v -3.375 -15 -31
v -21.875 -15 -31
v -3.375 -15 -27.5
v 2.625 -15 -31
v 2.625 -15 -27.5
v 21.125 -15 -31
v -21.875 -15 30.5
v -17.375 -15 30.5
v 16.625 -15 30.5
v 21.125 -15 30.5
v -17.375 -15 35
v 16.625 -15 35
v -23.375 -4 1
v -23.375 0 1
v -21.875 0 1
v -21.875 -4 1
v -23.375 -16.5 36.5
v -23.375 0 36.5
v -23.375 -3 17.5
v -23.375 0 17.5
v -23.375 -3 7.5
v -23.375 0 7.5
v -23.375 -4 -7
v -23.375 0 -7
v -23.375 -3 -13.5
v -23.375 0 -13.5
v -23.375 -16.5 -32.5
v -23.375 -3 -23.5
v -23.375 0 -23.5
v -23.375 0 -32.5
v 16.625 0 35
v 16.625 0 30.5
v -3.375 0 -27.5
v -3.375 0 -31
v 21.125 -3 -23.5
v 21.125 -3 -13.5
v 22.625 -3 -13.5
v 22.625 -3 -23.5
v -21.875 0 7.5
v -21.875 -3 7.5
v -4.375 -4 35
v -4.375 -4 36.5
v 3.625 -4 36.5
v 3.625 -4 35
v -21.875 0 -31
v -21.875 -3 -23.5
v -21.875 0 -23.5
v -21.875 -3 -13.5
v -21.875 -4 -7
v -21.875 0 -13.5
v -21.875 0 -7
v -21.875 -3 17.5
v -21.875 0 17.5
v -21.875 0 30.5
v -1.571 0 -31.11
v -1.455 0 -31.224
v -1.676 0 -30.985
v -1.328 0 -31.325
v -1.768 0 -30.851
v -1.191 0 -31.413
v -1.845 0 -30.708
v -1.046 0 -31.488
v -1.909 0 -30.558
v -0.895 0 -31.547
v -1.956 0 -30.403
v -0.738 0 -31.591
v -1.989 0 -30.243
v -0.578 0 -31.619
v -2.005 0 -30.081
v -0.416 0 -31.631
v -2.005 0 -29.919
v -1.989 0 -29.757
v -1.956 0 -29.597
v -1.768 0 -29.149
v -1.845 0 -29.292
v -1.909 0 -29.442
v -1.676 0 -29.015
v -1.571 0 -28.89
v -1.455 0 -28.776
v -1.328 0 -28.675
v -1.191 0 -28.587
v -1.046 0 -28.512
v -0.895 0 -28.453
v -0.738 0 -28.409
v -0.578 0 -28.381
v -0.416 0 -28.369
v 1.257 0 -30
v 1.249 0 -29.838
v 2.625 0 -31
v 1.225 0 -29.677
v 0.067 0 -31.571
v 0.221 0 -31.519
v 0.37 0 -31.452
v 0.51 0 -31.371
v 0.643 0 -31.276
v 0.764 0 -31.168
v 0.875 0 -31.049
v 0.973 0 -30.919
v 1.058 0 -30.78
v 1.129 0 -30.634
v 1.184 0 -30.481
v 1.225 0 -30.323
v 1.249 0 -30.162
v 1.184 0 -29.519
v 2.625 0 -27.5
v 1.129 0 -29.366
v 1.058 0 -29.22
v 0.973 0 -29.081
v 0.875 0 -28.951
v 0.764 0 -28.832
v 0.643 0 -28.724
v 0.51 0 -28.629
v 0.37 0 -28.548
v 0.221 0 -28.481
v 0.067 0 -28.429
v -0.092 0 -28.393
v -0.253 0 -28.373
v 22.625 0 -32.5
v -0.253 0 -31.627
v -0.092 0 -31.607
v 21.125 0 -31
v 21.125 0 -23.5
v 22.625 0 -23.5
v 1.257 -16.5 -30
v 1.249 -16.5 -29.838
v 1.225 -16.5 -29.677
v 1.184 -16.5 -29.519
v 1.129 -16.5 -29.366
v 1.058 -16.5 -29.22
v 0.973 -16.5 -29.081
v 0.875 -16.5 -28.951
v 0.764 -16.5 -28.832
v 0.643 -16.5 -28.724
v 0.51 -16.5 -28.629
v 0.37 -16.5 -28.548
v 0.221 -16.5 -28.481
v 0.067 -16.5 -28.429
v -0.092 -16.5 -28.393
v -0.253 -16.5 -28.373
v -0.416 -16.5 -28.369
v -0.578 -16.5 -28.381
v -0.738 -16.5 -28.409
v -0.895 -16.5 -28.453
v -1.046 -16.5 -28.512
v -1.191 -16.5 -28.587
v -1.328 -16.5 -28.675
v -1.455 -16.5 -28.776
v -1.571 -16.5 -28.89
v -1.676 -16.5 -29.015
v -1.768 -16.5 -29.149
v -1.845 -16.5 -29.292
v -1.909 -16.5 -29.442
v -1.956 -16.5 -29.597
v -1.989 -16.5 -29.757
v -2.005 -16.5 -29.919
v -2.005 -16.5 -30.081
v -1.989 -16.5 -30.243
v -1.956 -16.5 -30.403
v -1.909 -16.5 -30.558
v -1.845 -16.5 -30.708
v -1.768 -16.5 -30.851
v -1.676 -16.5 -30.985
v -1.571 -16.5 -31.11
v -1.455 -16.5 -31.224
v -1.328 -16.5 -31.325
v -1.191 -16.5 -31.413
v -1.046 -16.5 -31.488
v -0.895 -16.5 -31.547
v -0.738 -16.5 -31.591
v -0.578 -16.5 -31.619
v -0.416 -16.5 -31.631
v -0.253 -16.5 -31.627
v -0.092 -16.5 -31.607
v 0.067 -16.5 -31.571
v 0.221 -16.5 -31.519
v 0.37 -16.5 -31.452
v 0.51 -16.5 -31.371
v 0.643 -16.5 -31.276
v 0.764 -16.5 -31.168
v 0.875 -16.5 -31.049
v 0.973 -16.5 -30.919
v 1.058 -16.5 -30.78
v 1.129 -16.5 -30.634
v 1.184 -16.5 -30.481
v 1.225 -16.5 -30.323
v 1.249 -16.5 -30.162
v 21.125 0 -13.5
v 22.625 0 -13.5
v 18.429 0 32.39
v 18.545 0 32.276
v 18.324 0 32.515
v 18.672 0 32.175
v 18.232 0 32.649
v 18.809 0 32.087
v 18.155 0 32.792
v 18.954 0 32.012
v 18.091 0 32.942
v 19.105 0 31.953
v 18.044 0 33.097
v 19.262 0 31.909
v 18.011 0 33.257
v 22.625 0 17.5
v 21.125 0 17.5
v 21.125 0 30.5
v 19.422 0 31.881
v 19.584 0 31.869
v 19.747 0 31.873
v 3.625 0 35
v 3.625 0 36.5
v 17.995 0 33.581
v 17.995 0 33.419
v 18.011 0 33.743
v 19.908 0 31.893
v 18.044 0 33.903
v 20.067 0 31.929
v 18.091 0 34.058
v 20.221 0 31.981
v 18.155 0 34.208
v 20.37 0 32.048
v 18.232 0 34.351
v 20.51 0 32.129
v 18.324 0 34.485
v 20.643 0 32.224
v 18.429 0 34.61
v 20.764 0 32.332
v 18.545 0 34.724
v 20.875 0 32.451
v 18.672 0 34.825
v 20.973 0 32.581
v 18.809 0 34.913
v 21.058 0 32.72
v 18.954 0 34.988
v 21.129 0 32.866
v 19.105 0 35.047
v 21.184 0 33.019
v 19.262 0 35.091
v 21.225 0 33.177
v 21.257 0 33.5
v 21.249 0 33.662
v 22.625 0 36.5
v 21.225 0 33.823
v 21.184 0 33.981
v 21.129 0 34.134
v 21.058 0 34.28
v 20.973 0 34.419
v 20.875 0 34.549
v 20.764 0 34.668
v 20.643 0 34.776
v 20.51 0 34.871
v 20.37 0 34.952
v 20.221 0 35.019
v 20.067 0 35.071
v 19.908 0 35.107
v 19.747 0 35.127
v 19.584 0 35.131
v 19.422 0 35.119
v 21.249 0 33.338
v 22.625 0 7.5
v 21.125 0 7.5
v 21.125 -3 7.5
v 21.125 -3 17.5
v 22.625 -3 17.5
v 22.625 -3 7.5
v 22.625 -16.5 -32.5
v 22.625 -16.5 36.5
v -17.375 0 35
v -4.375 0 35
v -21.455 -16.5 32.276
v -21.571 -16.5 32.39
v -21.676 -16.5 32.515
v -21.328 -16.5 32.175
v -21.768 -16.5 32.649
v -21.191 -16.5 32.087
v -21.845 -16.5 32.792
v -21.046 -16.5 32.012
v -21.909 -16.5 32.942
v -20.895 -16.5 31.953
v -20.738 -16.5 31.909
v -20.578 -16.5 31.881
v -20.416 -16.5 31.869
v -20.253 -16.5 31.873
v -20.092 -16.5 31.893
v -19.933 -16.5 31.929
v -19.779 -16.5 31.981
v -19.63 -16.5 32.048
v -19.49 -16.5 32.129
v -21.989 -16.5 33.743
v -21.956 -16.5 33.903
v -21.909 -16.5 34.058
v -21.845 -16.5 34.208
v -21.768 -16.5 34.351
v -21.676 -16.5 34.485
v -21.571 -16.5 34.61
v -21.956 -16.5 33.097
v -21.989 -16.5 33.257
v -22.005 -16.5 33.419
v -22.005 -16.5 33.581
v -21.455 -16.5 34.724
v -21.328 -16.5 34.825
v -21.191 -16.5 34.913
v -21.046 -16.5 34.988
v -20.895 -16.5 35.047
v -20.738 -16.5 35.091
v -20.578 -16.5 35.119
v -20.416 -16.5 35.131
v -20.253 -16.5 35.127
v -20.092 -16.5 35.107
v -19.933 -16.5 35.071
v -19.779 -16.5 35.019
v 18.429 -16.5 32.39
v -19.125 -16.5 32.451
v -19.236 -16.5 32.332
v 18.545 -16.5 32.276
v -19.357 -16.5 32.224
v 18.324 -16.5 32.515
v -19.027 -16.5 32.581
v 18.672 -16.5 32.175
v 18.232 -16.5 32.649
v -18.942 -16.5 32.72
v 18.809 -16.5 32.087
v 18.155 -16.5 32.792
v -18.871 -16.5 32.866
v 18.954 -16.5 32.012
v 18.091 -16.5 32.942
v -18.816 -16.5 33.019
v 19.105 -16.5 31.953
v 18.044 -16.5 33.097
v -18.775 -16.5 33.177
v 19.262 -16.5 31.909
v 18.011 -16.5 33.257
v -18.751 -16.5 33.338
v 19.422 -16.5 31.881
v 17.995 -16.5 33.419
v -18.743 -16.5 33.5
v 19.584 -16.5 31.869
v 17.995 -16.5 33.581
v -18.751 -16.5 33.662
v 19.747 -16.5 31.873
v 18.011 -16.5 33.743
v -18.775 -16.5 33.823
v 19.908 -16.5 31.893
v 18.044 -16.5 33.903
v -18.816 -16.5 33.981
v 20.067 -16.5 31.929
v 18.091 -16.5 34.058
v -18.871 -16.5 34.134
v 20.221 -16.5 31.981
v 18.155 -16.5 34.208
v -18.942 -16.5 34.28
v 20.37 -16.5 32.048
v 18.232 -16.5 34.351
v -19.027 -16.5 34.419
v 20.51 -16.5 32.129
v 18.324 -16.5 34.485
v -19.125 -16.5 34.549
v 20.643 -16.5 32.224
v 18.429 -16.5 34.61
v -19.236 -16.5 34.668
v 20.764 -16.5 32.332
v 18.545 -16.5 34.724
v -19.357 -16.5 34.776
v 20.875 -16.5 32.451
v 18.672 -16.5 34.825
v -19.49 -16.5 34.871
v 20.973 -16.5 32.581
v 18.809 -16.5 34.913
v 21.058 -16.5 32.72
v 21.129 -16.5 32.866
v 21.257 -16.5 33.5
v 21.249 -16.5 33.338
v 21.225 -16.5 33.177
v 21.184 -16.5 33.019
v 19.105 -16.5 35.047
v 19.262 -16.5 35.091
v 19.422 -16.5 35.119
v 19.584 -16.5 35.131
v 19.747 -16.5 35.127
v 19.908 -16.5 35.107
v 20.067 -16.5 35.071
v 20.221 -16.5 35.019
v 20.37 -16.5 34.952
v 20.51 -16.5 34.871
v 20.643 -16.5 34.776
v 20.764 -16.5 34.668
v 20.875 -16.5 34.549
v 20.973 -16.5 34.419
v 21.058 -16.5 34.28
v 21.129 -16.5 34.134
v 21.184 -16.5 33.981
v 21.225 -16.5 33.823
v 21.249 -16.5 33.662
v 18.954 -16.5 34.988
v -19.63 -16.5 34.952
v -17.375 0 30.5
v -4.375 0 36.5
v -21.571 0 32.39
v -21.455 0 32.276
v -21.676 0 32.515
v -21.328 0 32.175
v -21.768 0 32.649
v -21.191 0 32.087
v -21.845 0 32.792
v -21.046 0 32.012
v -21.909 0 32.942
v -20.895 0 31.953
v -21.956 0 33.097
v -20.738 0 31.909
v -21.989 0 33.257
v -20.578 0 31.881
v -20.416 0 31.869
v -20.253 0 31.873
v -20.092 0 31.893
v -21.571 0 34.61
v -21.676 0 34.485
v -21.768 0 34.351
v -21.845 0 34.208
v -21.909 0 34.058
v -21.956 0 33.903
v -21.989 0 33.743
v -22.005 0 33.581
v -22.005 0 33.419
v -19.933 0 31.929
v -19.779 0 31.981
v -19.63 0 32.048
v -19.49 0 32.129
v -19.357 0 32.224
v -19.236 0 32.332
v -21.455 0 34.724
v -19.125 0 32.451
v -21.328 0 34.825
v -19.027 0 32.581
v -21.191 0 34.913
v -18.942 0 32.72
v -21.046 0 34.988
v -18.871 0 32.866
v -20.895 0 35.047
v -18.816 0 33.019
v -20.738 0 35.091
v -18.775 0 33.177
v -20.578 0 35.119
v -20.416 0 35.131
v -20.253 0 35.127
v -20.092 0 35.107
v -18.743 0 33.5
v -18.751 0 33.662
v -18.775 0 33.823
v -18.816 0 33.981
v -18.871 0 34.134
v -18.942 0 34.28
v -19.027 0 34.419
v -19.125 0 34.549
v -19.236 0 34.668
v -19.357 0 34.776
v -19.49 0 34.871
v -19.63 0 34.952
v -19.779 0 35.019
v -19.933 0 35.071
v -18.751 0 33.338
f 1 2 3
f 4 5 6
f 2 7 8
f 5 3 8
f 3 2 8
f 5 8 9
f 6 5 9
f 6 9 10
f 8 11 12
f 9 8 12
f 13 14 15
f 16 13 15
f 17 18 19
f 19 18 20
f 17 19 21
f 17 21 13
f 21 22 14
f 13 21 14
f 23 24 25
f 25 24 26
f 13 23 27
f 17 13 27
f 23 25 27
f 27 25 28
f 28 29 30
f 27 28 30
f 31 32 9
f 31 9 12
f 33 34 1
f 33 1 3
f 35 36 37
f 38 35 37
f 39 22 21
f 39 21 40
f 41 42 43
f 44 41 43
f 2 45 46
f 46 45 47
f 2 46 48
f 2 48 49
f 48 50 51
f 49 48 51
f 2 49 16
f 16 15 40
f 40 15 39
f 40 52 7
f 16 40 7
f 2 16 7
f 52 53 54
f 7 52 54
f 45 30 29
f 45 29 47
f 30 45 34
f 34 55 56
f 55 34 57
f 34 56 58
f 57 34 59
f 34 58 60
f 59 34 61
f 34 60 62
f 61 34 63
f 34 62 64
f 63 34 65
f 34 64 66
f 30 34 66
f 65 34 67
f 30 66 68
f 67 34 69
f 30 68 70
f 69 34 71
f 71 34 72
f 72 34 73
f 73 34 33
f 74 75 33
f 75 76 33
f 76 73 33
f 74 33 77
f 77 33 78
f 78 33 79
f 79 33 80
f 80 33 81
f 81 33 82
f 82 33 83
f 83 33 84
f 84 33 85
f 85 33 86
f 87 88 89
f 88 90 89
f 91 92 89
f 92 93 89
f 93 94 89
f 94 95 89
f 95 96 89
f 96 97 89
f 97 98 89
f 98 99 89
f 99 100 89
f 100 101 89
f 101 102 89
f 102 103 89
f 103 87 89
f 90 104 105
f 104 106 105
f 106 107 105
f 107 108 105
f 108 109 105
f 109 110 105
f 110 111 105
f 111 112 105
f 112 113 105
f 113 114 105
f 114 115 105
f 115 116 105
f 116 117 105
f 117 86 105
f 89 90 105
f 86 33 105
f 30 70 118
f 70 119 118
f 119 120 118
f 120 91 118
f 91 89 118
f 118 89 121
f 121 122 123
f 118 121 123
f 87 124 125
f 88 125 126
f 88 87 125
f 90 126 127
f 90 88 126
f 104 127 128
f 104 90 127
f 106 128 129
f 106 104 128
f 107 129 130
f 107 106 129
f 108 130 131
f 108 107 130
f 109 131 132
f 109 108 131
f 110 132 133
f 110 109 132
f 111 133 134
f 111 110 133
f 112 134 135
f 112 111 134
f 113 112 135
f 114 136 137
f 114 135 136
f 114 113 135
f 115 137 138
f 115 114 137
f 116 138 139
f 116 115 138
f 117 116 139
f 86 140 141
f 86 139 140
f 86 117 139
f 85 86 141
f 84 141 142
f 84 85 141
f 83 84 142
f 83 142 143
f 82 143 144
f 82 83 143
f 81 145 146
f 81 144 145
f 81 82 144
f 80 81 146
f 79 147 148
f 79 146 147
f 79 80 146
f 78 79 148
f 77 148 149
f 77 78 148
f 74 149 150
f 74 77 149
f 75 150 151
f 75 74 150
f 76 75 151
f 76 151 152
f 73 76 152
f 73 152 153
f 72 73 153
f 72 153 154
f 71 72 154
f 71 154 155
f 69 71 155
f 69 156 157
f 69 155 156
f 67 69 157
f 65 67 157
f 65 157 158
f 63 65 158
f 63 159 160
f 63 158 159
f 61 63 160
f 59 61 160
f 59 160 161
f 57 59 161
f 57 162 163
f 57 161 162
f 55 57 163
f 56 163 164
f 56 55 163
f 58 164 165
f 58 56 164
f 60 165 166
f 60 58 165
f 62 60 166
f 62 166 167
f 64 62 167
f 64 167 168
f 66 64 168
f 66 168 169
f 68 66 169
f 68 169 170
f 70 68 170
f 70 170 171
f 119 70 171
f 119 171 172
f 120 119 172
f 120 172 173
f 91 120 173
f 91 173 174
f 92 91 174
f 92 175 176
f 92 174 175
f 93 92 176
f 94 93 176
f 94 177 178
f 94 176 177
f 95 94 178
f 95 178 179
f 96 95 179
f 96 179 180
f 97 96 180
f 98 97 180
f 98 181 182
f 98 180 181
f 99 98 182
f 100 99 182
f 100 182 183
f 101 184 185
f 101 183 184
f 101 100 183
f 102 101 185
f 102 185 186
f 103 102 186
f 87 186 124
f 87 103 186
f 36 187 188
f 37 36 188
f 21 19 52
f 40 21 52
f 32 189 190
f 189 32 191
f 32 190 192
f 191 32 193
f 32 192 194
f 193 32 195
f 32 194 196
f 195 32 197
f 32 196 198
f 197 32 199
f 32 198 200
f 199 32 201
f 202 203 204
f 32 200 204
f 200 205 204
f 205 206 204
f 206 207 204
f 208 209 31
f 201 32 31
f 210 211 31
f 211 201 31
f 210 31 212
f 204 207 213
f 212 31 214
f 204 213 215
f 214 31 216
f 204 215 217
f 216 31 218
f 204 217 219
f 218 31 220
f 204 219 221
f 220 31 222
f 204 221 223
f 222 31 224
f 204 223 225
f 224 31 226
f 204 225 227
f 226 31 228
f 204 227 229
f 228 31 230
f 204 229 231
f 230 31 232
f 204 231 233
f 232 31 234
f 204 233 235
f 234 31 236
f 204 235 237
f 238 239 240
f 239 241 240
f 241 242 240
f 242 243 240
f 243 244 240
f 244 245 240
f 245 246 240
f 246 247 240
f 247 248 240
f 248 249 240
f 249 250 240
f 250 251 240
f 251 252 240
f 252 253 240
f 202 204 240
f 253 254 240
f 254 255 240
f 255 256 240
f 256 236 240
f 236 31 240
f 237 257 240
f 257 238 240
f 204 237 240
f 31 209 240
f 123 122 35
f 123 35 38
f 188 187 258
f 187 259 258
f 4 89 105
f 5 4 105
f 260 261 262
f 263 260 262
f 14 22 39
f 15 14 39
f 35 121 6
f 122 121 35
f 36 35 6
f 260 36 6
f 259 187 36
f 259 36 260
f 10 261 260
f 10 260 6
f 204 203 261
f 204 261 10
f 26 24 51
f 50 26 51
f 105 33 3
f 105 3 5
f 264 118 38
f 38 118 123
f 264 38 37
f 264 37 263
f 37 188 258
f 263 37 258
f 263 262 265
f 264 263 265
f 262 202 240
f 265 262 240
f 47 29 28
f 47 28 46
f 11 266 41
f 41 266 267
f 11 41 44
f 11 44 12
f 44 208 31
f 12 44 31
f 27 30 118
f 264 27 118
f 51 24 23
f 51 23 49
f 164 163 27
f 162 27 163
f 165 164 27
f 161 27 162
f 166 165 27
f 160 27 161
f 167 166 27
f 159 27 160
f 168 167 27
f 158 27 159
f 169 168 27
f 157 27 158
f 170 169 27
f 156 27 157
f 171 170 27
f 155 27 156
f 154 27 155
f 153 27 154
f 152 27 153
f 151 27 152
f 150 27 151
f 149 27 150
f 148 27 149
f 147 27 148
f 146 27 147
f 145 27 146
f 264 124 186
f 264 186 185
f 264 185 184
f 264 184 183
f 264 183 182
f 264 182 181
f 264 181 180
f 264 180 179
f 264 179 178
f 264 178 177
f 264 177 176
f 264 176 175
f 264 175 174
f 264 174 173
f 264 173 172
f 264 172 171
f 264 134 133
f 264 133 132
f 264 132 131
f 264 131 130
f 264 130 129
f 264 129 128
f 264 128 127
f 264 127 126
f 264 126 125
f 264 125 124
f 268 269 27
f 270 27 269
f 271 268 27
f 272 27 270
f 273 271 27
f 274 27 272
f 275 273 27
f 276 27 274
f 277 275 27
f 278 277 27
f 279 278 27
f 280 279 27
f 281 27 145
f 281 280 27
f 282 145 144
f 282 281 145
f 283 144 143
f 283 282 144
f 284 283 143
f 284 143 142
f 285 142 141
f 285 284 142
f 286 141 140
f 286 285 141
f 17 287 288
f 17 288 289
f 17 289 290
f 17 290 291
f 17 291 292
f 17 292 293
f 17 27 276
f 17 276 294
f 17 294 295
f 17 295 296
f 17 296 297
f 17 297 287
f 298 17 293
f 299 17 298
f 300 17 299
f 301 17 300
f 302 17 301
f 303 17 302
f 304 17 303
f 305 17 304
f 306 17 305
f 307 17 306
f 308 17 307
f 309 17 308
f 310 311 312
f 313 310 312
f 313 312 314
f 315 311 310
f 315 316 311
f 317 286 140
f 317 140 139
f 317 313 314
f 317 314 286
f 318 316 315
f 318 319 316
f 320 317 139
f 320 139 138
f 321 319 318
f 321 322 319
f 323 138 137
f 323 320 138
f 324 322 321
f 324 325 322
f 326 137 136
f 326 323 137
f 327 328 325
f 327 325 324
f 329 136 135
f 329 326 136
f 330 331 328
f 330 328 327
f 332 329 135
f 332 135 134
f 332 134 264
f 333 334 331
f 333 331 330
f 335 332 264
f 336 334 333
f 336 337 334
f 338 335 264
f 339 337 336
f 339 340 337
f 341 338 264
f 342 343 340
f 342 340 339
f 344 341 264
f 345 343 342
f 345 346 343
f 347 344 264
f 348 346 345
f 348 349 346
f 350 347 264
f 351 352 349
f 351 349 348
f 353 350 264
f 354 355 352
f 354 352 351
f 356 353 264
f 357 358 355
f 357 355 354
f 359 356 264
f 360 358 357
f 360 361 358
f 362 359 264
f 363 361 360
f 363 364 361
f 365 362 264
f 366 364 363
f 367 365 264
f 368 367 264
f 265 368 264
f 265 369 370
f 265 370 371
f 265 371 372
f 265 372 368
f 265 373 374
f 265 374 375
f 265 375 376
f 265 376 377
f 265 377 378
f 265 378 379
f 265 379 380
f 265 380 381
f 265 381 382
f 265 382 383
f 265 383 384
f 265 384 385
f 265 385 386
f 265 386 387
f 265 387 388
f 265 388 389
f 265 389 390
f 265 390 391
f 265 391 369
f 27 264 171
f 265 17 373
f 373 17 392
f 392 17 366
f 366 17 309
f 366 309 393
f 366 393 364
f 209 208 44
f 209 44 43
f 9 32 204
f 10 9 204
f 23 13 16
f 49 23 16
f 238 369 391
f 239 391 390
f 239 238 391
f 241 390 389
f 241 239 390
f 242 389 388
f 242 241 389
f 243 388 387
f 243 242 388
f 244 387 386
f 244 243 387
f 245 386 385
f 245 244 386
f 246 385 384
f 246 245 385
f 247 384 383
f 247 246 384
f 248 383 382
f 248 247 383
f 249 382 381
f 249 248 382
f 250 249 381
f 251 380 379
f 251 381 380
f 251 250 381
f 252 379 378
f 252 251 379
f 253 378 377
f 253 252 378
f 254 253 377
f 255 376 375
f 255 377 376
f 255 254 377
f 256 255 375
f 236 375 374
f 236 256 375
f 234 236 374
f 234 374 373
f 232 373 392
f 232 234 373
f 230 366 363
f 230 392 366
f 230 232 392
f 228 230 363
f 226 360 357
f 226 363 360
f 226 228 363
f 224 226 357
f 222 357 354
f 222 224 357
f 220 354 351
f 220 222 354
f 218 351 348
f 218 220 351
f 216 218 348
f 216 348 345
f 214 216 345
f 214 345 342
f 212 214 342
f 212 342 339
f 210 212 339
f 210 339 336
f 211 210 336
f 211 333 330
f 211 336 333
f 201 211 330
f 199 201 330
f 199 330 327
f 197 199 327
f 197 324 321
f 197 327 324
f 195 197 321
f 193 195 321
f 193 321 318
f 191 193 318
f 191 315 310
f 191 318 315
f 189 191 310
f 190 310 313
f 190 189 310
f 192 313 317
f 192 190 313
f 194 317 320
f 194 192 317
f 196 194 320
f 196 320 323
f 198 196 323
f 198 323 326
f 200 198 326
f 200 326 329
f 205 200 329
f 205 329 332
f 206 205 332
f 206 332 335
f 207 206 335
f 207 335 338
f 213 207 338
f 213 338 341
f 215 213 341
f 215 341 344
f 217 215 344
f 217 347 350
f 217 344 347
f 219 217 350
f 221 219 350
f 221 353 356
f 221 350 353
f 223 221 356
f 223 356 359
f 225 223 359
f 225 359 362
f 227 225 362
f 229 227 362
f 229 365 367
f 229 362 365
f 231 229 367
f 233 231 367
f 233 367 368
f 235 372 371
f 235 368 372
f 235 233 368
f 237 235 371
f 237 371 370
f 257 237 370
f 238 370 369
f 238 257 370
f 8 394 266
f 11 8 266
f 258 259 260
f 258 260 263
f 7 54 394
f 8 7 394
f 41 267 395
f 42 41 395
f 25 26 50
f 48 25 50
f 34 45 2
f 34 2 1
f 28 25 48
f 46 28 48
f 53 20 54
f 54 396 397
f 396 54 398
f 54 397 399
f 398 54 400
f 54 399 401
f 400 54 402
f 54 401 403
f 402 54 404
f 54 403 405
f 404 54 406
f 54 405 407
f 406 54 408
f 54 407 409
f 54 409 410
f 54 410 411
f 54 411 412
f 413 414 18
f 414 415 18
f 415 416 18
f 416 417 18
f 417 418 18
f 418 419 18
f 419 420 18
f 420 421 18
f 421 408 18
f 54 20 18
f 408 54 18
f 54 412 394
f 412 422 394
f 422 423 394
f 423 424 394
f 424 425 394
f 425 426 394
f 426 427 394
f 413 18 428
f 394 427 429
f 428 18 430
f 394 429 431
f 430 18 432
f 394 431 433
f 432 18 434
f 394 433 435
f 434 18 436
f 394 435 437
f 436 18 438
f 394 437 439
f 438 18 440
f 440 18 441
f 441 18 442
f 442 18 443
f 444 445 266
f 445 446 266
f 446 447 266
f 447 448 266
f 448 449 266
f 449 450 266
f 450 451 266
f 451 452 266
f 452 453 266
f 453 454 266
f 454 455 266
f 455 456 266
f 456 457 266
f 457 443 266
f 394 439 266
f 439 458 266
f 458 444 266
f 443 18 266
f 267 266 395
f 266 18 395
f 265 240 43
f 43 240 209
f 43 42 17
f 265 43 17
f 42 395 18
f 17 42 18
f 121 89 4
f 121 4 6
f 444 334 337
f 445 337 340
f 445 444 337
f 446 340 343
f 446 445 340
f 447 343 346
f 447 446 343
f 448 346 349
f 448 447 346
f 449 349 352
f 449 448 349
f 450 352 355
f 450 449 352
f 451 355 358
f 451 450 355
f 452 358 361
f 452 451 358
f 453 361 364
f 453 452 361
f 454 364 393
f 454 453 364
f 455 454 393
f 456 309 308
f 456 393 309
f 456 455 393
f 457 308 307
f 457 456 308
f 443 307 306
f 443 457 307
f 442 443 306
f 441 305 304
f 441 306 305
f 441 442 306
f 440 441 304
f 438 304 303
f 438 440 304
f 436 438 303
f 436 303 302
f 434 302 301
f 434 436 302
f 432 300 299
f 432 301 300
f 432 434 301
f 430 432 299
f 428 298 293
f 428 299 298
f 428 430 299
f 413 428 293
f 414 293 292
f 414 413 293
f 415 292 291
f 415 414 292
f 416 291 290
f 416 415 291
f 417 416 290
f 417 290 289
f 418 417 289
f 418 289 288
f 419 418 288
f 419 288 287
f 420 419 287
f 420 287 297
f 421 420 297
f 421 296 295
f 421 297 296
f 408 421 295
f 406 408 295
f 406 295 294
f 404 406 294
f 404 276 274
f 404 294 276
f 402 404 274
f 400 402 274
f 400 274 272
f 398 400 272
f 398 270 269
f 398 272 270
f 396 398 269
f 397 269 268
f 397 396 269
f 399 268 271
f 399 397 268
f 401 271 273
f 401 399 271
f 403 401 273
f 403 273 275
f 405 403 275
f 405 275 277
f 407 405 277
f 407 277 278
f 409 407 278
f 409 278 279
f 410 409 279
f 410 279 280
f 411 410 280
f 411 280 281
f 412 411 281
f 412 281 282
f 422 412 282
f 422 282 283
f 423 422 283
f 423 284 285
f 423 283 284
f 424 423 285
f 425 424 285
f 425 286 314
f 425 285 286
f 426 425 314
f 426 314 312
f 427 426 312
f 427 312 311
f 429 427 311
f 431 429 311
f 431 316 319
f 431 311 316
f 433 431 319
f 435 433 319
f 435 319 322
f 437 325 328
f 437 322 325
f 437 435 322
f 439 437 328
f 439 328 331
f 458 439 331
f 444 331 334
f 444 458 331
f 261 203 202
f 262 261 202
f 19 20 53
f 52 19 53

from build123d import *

# Parameters (mm, degrees)
F8_DEPTH  = 16.5
F2_W      = 43
F2_H      = 66
F9_DEPTH  = 15
F4_W      = 6
F4_H      = 6
F4_H_2    = 5
F10_DEPTH = 16.5
F5_W      = 8
F5_H      = 6
F5_W_2    = 6
F5_H_2    = 8
F11_DEPTH = 4
F6_W      = 6
F6_H      = 10
F12_DEPTH = 3
F7_R      = 1.63195
F13_DEPTH = 16.501


with BuildPart() as f8:
    # F1 (on Front) → F8 (new body)
    with BuildSketch(Plane.XZ):
        Polygon((22.625, -32.5), (22.625, -24.5), (22.625, 36.5), (-23.375, 36.5), (-23.375, -32.5), align=None)
    extrude(amount=F8_DEPTH)

    # F2 (on Front) → F9 (cut)
    with BuildSketch(Plane.XZ):
        with Locations((-0.375, 2)):
            Rectangle(F2_W, F2_H)
    extrude(amount=F9_DEPTH, mode=Mode.SUBTRACT)

    # F4 (on Front) → F10 (join, through all)
    with BuildSketch(Plane.XZ):
        with Locations((-20.375, 33.5)):
            Rectangle(F4_W, F4_H)
        with Locations((19.625, 33.5)):
            Rectangle(F4_W, F4_H)
        with Locations((-0.375, -30)):
            Rectangle(F4_W, F4_H_2)
    extrude(amount=F10_DEPTH)

    # F5 (on Front) → F11 (cut)
    with BuildSketch(Plane.XZ):
        with Locations((-0.375, 33.5)):
            Rectangle(F5_W, F5_H)
        with Locations((-22.875, -3)):
            Rectangle(F5_W_2, F5_H_2)
    extrude(amount=F11_DEPTH, mode=Mode.SUBTRACT)

    # F6 (on Front) → F12 (cut)
    with BuildSketch(Plane.XZ):
        with Locations((-22.875, 12.5)):
            Rectangle(F6_W, F6_H)
        with Locations((-22.875, -18.5)):
            Rectangle(F6_W, F6_H)
        with Locations((22.125, 12.5)):
            Rectangle(F6_W, F6_H)
        with Locations((22.125, -18.5)):
            Rectangle(F6_W, F6_H)
    extrude(amount=F12_DEPTH, mode=Mode.SUBTRACT)

    # F7 (on Front) → F13 (cut, through all)
    with BuildSketch(Plane.XZ):
        with Locations((-0.375, -30)):
            Circle(F7_R)
        with Locations((-20.375, 33.5)):
            Circle(F7_R)
        with Locations((19.625, 33.5)):
            Circle(F7_R)
    extrude(amount=F13_DEPTH, mode=Mode.SUBTRACT)


solid = f8.part
